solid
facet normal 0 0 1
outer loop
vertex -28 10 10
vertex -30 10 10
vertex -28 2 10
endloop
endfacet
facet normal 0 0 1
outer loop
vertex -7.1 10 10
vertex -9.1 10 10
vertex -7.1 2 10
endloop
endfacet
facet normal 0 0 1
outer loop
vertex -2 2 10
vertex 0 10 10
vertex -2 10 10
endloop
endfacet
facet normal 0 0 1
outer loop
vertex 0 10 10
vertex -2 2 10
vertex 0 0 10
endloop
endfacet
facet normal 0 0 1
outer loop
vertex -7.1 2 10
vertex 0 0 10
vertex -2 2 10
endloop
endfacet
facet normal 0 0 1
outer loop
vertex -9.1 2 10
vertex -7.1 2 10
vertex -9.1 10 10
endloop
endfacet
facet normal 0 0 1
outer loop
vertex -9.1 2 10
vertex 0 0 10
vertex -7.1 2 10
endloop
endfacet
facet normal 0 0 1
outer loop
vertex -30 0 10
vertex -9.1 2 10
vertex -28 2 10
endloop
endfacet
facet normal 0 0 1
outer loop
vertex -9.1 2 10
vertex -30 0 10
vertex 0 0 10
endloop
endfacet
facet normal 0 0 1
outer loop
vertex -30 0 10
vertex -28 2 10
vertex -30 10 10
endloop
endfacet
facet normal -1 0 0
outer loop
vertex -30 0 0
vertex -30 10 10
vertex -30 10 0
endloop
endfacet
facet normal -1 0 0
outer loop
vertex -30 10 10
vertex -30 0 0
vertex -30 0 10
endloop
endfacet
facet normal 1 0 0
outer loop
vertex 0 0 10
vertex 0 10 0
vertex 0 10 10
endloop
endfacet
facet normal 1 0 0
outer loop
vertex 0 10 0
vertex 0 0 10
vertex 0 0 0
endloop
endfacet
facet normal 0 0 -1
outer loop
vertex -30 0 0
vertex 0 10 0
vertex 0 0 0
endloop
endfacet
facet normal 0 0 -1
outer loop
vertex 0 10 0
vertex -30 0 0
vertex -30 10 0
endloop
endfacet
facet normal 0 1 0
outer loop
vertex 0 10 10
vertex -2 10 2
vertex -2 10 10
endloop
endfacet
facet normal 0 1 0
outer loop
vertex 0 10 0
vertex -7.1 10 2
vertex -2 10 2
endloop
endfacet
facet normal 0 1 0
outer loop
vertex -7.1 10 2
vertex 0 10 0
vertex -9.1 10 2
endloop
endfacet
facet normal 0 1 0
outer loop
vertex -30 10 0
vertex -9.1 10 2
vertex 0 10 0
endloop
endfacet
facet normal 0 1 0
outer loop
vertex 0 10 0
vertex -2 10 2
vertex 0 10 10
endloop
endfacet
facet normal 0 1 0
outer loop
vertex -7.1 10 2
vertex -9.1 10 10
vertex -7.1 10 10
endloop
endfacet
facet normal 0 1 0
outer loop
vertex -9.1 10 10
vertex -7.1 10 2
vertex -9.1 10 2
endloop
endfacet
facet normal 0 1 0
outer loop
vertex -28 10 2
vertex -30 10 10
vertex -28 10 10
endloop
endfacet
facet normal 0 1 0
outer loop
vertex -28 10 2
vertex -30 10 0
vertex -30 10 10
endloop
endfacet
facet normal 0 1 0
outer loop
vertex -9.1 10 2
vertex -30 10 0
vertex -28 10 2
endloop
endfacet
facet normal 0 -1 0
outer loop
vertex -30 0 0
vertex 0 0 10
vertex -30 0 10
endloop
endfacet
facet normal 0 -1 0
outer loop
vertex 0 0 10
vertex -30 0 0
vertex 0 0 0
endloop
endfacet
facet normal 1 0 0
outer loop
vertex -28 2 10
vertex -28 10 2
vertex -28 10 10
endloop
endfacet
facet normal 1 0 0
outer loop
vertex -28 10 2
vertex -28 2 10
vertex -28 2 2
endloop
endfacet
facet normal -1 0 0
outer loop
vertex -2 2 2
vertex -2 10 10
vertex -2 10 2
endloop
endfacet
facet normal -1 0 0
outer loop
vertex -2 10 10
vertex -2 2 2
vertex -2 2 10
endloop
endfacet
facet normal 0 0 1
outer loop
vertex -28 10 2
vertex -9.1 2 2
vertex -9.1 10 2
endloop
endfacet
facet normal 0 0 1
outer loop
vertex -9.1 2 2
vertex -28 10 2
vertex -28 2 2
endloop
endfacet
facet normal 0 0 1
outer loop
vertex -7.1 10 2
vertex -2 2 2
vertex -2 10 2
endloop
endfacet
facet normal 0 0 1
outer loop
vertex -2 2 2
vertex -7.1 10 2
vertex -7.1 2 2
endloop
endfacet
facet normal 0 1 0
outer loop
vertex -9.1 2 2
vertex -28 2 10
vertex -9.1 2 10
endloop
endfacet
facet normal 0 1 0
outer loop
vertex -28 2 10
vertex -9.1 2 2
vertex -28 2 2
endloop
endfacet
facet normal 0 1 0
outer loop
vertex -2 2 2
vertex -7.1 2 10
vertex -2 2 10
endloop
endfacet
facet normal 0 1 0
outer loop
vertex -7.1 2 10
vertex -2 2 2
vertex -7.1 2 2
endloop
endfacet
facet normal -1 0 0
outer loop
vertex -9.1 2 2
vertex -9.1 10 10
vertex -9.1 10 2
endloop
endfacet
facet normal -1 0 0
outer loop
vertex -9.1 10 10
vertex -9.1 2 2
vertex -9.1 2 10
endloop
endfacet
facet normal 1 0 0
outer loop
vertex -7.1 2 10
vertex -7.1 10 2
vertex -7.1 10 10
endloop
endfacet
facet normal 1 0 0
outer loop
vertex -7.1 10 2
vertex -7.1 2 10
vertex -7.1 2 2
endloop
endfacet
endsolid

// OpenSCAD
plexi_height=5.1;
total_height=30;
wall_thickness=2;

xy=10;

rotate([0,-90,0]){
	union(){
		translate([0,0,plexi_height + wall_thickness])
			cube([xy,xy,wall_thickness]);
		difference(){
			cube([xy,xy,total_height]);
			translate([wall_thickness,wall_thickness,wall_thickness])
			cube([xy,xy,total_height - wall_thickness * 2]);
		}
	}
}
